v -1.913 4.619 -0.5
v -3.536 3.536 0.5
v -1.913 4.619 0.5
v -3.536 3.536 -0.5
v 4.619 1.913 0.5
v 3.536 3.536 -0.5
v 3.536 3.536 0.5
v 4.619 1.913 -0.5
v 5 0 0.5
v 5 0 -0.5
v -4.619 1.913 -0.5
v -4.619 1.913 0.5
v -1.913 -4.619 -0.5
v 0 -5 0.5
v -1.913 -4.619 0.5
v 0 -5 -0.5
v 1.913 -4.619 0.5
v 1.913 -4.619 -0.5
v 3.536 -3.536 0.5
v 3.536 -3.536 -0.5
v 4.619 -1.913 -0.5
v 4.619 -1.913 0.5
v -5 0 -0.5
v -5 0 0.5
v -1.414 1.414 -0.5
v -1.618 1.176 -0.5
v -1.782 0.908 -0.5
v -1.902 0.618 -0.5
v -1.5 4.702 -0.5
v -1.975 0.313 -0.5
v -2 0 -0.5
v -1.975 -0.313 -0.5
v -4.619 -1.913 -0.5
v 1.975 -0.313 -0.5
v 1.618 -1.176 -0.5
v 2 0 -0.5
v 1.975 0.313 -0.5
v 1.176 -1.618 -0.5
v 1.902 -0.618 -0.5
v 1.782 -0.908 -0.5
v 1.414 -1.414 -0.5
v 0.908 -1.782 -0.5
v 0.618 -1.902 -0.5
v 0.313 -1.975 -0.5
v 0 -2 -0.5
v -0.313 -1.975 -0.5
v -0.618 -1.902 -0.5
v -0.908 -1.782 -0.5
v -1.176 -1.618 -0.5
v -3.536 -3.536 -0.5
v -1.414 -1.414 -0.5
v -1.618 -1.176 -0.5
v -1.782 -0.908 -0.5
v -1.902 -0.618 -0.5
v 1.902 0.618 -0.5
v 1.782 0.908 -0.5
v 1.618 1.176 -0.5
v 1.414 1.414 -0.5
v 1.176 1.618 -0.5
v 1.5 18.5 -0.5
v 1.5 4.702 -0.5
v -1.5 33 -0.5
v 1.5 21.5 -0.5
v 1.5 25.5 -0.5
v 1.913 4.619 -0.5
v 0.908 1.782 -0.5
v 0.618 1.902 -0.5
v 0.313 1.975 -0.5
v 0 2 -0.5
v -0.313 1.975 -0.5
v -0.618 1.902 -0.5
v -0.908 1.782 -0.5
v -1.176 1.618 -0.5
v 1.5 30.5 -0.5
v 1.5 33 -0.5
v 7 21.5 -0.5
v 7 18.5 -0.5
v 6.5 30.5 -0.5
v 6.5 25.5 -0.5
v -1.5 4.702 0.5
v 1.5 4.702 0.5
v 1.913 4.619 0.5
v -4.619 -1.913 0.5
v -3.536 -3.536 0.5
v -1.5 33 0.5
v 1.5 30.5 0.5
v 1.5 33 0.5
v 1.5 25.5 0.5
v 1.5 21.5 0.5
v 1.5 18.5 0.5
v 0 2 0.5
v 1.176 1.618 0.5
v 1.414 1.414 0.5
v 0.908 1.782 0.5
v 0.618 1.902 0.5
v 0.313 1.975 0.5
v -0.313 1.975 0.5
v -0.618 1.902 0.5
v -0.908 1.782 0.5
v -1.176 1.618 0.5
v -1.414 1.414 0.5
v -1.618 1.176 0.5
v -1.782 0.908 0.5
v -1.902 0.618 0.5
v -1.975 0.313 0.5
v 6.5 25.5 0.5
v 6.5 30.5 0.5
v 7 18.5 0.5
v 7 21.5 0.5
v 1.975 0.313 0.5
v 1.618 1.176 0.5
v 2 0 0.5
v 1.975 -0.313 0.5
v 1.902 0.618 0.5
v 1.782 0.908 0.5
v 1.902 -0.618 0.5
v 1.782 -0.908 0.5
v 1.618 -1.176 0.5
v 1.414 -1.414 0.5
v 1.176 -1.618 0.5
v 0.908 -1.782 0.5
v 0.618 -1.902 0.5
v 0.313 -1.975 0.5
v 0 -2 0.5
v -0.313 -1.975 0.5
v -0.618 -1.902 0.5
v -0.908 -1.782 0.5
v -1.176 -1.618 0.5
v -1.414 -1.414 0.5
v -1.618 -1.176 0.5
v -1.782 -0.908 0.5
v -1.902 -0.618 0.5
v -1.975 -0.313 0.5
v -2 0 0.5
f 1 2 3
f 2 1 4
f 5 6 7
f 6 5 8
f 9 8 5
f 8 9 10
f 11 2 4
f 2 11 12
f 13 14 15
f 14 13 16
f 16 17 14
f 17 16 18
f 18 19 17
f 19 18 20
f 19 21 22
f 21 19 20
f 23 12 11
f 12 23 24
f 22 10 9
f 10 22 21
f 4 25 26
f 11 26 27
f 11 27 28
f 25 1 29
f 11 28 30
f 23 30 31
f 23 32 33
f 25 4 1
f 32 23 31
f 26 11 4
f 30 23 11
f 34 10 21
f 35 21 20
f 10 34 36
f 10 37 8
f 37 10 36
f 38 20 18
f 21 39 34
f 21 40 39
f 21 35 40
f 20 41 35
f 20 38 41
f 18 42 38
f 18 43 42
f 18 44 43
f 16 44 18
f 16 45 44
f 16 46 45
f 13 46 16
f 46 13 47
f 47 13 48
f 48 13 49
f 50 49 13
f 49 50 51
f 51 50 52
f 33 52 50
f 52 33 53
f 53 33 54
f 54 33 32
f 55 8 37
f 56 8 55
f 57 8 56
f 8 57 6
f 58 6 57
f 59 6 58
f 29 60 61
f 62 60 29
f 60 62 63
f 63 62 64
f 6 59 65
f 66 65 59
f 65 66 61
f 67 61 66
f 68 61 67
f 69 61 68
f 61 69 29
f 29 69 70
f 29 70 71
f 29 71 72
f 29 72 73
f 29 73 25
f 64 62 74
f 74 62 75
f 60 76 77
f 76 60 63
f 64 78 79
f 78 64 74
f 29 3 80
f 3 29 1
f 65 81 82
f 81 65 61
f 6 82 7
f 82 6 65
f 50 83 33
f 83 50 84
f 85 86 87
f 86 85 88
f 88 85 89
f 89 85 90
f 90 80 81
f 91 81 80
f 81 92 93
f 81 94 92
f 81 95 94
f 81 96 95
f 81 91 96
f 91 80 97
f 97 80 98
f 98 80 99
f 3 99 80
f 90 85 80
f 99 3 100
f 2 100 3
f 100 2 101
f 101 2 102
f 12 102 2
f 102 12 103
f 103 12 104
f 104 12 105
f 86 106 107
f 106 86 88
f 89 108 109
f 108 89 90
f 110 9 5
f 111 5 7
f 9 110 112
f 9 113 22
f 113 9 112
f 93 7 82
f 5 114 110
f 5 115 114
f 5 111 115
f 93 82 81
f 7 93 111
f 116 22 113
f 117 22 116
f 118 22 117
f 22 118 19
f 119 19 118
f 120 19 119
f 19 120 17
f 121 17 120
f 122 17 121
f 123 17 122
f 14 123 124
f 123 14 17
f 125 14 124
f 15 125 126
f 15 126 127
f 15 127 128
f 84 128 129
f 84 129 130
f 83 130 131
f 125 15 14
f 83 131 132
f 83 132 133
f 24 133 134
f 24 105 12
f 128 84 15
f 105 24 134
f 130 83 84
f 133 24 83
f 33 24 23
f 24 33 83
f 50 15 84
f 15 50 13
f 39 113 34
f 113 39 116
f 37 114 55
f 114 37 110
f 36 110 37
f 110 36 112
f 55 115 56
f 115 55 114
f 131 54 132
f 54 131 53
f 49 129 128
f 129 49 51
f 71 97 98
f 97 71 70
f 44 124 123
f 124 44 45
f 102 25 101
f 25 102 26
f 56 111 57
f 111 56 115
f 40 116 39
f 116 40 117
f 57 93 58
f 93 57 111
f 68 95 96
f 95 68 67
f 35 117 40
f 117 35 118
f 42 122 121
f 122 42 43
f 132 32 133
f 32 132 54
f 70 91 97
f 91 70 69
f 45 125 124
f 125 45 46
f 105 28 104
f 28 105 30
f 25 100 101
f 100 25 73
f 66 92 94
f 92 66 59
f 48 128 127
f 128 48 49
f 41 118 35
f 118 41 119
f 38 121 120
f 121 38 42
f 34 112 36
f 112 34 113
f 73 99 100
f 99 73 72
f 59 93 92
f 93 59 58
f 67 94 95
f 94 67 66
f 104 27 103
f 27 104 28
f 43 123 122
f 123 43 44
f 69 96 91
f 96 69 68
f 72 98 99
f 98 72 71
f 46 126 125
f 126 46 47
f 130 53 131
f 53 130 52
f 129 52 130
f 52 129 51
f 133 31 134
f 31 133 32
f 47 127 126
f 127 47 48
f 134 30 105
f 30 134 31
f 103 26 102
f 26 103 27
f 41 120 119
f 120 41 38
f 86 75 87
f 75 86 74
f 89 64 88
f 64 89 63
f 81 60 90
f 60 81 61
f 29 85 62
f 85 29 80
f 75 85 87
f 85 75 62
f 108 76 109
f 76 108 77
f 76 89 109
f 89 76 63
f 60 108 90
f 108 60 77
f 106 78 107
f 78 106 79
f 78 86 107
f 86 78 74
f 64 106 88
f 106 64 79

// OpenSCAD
module key_simple(){
color("gray"){
difference(){
cylinder(1,5,5, center= true);
cylinder(2,2,2, center= true, $fn =40);



}
translate([0,18,0])
cube([3,30,1], center =true);

translate([4,20,0])
cube([6,3,1], center =true);

translate([4,28,0])
cube([5,5,1], center =true);
}
}

key_simple();
